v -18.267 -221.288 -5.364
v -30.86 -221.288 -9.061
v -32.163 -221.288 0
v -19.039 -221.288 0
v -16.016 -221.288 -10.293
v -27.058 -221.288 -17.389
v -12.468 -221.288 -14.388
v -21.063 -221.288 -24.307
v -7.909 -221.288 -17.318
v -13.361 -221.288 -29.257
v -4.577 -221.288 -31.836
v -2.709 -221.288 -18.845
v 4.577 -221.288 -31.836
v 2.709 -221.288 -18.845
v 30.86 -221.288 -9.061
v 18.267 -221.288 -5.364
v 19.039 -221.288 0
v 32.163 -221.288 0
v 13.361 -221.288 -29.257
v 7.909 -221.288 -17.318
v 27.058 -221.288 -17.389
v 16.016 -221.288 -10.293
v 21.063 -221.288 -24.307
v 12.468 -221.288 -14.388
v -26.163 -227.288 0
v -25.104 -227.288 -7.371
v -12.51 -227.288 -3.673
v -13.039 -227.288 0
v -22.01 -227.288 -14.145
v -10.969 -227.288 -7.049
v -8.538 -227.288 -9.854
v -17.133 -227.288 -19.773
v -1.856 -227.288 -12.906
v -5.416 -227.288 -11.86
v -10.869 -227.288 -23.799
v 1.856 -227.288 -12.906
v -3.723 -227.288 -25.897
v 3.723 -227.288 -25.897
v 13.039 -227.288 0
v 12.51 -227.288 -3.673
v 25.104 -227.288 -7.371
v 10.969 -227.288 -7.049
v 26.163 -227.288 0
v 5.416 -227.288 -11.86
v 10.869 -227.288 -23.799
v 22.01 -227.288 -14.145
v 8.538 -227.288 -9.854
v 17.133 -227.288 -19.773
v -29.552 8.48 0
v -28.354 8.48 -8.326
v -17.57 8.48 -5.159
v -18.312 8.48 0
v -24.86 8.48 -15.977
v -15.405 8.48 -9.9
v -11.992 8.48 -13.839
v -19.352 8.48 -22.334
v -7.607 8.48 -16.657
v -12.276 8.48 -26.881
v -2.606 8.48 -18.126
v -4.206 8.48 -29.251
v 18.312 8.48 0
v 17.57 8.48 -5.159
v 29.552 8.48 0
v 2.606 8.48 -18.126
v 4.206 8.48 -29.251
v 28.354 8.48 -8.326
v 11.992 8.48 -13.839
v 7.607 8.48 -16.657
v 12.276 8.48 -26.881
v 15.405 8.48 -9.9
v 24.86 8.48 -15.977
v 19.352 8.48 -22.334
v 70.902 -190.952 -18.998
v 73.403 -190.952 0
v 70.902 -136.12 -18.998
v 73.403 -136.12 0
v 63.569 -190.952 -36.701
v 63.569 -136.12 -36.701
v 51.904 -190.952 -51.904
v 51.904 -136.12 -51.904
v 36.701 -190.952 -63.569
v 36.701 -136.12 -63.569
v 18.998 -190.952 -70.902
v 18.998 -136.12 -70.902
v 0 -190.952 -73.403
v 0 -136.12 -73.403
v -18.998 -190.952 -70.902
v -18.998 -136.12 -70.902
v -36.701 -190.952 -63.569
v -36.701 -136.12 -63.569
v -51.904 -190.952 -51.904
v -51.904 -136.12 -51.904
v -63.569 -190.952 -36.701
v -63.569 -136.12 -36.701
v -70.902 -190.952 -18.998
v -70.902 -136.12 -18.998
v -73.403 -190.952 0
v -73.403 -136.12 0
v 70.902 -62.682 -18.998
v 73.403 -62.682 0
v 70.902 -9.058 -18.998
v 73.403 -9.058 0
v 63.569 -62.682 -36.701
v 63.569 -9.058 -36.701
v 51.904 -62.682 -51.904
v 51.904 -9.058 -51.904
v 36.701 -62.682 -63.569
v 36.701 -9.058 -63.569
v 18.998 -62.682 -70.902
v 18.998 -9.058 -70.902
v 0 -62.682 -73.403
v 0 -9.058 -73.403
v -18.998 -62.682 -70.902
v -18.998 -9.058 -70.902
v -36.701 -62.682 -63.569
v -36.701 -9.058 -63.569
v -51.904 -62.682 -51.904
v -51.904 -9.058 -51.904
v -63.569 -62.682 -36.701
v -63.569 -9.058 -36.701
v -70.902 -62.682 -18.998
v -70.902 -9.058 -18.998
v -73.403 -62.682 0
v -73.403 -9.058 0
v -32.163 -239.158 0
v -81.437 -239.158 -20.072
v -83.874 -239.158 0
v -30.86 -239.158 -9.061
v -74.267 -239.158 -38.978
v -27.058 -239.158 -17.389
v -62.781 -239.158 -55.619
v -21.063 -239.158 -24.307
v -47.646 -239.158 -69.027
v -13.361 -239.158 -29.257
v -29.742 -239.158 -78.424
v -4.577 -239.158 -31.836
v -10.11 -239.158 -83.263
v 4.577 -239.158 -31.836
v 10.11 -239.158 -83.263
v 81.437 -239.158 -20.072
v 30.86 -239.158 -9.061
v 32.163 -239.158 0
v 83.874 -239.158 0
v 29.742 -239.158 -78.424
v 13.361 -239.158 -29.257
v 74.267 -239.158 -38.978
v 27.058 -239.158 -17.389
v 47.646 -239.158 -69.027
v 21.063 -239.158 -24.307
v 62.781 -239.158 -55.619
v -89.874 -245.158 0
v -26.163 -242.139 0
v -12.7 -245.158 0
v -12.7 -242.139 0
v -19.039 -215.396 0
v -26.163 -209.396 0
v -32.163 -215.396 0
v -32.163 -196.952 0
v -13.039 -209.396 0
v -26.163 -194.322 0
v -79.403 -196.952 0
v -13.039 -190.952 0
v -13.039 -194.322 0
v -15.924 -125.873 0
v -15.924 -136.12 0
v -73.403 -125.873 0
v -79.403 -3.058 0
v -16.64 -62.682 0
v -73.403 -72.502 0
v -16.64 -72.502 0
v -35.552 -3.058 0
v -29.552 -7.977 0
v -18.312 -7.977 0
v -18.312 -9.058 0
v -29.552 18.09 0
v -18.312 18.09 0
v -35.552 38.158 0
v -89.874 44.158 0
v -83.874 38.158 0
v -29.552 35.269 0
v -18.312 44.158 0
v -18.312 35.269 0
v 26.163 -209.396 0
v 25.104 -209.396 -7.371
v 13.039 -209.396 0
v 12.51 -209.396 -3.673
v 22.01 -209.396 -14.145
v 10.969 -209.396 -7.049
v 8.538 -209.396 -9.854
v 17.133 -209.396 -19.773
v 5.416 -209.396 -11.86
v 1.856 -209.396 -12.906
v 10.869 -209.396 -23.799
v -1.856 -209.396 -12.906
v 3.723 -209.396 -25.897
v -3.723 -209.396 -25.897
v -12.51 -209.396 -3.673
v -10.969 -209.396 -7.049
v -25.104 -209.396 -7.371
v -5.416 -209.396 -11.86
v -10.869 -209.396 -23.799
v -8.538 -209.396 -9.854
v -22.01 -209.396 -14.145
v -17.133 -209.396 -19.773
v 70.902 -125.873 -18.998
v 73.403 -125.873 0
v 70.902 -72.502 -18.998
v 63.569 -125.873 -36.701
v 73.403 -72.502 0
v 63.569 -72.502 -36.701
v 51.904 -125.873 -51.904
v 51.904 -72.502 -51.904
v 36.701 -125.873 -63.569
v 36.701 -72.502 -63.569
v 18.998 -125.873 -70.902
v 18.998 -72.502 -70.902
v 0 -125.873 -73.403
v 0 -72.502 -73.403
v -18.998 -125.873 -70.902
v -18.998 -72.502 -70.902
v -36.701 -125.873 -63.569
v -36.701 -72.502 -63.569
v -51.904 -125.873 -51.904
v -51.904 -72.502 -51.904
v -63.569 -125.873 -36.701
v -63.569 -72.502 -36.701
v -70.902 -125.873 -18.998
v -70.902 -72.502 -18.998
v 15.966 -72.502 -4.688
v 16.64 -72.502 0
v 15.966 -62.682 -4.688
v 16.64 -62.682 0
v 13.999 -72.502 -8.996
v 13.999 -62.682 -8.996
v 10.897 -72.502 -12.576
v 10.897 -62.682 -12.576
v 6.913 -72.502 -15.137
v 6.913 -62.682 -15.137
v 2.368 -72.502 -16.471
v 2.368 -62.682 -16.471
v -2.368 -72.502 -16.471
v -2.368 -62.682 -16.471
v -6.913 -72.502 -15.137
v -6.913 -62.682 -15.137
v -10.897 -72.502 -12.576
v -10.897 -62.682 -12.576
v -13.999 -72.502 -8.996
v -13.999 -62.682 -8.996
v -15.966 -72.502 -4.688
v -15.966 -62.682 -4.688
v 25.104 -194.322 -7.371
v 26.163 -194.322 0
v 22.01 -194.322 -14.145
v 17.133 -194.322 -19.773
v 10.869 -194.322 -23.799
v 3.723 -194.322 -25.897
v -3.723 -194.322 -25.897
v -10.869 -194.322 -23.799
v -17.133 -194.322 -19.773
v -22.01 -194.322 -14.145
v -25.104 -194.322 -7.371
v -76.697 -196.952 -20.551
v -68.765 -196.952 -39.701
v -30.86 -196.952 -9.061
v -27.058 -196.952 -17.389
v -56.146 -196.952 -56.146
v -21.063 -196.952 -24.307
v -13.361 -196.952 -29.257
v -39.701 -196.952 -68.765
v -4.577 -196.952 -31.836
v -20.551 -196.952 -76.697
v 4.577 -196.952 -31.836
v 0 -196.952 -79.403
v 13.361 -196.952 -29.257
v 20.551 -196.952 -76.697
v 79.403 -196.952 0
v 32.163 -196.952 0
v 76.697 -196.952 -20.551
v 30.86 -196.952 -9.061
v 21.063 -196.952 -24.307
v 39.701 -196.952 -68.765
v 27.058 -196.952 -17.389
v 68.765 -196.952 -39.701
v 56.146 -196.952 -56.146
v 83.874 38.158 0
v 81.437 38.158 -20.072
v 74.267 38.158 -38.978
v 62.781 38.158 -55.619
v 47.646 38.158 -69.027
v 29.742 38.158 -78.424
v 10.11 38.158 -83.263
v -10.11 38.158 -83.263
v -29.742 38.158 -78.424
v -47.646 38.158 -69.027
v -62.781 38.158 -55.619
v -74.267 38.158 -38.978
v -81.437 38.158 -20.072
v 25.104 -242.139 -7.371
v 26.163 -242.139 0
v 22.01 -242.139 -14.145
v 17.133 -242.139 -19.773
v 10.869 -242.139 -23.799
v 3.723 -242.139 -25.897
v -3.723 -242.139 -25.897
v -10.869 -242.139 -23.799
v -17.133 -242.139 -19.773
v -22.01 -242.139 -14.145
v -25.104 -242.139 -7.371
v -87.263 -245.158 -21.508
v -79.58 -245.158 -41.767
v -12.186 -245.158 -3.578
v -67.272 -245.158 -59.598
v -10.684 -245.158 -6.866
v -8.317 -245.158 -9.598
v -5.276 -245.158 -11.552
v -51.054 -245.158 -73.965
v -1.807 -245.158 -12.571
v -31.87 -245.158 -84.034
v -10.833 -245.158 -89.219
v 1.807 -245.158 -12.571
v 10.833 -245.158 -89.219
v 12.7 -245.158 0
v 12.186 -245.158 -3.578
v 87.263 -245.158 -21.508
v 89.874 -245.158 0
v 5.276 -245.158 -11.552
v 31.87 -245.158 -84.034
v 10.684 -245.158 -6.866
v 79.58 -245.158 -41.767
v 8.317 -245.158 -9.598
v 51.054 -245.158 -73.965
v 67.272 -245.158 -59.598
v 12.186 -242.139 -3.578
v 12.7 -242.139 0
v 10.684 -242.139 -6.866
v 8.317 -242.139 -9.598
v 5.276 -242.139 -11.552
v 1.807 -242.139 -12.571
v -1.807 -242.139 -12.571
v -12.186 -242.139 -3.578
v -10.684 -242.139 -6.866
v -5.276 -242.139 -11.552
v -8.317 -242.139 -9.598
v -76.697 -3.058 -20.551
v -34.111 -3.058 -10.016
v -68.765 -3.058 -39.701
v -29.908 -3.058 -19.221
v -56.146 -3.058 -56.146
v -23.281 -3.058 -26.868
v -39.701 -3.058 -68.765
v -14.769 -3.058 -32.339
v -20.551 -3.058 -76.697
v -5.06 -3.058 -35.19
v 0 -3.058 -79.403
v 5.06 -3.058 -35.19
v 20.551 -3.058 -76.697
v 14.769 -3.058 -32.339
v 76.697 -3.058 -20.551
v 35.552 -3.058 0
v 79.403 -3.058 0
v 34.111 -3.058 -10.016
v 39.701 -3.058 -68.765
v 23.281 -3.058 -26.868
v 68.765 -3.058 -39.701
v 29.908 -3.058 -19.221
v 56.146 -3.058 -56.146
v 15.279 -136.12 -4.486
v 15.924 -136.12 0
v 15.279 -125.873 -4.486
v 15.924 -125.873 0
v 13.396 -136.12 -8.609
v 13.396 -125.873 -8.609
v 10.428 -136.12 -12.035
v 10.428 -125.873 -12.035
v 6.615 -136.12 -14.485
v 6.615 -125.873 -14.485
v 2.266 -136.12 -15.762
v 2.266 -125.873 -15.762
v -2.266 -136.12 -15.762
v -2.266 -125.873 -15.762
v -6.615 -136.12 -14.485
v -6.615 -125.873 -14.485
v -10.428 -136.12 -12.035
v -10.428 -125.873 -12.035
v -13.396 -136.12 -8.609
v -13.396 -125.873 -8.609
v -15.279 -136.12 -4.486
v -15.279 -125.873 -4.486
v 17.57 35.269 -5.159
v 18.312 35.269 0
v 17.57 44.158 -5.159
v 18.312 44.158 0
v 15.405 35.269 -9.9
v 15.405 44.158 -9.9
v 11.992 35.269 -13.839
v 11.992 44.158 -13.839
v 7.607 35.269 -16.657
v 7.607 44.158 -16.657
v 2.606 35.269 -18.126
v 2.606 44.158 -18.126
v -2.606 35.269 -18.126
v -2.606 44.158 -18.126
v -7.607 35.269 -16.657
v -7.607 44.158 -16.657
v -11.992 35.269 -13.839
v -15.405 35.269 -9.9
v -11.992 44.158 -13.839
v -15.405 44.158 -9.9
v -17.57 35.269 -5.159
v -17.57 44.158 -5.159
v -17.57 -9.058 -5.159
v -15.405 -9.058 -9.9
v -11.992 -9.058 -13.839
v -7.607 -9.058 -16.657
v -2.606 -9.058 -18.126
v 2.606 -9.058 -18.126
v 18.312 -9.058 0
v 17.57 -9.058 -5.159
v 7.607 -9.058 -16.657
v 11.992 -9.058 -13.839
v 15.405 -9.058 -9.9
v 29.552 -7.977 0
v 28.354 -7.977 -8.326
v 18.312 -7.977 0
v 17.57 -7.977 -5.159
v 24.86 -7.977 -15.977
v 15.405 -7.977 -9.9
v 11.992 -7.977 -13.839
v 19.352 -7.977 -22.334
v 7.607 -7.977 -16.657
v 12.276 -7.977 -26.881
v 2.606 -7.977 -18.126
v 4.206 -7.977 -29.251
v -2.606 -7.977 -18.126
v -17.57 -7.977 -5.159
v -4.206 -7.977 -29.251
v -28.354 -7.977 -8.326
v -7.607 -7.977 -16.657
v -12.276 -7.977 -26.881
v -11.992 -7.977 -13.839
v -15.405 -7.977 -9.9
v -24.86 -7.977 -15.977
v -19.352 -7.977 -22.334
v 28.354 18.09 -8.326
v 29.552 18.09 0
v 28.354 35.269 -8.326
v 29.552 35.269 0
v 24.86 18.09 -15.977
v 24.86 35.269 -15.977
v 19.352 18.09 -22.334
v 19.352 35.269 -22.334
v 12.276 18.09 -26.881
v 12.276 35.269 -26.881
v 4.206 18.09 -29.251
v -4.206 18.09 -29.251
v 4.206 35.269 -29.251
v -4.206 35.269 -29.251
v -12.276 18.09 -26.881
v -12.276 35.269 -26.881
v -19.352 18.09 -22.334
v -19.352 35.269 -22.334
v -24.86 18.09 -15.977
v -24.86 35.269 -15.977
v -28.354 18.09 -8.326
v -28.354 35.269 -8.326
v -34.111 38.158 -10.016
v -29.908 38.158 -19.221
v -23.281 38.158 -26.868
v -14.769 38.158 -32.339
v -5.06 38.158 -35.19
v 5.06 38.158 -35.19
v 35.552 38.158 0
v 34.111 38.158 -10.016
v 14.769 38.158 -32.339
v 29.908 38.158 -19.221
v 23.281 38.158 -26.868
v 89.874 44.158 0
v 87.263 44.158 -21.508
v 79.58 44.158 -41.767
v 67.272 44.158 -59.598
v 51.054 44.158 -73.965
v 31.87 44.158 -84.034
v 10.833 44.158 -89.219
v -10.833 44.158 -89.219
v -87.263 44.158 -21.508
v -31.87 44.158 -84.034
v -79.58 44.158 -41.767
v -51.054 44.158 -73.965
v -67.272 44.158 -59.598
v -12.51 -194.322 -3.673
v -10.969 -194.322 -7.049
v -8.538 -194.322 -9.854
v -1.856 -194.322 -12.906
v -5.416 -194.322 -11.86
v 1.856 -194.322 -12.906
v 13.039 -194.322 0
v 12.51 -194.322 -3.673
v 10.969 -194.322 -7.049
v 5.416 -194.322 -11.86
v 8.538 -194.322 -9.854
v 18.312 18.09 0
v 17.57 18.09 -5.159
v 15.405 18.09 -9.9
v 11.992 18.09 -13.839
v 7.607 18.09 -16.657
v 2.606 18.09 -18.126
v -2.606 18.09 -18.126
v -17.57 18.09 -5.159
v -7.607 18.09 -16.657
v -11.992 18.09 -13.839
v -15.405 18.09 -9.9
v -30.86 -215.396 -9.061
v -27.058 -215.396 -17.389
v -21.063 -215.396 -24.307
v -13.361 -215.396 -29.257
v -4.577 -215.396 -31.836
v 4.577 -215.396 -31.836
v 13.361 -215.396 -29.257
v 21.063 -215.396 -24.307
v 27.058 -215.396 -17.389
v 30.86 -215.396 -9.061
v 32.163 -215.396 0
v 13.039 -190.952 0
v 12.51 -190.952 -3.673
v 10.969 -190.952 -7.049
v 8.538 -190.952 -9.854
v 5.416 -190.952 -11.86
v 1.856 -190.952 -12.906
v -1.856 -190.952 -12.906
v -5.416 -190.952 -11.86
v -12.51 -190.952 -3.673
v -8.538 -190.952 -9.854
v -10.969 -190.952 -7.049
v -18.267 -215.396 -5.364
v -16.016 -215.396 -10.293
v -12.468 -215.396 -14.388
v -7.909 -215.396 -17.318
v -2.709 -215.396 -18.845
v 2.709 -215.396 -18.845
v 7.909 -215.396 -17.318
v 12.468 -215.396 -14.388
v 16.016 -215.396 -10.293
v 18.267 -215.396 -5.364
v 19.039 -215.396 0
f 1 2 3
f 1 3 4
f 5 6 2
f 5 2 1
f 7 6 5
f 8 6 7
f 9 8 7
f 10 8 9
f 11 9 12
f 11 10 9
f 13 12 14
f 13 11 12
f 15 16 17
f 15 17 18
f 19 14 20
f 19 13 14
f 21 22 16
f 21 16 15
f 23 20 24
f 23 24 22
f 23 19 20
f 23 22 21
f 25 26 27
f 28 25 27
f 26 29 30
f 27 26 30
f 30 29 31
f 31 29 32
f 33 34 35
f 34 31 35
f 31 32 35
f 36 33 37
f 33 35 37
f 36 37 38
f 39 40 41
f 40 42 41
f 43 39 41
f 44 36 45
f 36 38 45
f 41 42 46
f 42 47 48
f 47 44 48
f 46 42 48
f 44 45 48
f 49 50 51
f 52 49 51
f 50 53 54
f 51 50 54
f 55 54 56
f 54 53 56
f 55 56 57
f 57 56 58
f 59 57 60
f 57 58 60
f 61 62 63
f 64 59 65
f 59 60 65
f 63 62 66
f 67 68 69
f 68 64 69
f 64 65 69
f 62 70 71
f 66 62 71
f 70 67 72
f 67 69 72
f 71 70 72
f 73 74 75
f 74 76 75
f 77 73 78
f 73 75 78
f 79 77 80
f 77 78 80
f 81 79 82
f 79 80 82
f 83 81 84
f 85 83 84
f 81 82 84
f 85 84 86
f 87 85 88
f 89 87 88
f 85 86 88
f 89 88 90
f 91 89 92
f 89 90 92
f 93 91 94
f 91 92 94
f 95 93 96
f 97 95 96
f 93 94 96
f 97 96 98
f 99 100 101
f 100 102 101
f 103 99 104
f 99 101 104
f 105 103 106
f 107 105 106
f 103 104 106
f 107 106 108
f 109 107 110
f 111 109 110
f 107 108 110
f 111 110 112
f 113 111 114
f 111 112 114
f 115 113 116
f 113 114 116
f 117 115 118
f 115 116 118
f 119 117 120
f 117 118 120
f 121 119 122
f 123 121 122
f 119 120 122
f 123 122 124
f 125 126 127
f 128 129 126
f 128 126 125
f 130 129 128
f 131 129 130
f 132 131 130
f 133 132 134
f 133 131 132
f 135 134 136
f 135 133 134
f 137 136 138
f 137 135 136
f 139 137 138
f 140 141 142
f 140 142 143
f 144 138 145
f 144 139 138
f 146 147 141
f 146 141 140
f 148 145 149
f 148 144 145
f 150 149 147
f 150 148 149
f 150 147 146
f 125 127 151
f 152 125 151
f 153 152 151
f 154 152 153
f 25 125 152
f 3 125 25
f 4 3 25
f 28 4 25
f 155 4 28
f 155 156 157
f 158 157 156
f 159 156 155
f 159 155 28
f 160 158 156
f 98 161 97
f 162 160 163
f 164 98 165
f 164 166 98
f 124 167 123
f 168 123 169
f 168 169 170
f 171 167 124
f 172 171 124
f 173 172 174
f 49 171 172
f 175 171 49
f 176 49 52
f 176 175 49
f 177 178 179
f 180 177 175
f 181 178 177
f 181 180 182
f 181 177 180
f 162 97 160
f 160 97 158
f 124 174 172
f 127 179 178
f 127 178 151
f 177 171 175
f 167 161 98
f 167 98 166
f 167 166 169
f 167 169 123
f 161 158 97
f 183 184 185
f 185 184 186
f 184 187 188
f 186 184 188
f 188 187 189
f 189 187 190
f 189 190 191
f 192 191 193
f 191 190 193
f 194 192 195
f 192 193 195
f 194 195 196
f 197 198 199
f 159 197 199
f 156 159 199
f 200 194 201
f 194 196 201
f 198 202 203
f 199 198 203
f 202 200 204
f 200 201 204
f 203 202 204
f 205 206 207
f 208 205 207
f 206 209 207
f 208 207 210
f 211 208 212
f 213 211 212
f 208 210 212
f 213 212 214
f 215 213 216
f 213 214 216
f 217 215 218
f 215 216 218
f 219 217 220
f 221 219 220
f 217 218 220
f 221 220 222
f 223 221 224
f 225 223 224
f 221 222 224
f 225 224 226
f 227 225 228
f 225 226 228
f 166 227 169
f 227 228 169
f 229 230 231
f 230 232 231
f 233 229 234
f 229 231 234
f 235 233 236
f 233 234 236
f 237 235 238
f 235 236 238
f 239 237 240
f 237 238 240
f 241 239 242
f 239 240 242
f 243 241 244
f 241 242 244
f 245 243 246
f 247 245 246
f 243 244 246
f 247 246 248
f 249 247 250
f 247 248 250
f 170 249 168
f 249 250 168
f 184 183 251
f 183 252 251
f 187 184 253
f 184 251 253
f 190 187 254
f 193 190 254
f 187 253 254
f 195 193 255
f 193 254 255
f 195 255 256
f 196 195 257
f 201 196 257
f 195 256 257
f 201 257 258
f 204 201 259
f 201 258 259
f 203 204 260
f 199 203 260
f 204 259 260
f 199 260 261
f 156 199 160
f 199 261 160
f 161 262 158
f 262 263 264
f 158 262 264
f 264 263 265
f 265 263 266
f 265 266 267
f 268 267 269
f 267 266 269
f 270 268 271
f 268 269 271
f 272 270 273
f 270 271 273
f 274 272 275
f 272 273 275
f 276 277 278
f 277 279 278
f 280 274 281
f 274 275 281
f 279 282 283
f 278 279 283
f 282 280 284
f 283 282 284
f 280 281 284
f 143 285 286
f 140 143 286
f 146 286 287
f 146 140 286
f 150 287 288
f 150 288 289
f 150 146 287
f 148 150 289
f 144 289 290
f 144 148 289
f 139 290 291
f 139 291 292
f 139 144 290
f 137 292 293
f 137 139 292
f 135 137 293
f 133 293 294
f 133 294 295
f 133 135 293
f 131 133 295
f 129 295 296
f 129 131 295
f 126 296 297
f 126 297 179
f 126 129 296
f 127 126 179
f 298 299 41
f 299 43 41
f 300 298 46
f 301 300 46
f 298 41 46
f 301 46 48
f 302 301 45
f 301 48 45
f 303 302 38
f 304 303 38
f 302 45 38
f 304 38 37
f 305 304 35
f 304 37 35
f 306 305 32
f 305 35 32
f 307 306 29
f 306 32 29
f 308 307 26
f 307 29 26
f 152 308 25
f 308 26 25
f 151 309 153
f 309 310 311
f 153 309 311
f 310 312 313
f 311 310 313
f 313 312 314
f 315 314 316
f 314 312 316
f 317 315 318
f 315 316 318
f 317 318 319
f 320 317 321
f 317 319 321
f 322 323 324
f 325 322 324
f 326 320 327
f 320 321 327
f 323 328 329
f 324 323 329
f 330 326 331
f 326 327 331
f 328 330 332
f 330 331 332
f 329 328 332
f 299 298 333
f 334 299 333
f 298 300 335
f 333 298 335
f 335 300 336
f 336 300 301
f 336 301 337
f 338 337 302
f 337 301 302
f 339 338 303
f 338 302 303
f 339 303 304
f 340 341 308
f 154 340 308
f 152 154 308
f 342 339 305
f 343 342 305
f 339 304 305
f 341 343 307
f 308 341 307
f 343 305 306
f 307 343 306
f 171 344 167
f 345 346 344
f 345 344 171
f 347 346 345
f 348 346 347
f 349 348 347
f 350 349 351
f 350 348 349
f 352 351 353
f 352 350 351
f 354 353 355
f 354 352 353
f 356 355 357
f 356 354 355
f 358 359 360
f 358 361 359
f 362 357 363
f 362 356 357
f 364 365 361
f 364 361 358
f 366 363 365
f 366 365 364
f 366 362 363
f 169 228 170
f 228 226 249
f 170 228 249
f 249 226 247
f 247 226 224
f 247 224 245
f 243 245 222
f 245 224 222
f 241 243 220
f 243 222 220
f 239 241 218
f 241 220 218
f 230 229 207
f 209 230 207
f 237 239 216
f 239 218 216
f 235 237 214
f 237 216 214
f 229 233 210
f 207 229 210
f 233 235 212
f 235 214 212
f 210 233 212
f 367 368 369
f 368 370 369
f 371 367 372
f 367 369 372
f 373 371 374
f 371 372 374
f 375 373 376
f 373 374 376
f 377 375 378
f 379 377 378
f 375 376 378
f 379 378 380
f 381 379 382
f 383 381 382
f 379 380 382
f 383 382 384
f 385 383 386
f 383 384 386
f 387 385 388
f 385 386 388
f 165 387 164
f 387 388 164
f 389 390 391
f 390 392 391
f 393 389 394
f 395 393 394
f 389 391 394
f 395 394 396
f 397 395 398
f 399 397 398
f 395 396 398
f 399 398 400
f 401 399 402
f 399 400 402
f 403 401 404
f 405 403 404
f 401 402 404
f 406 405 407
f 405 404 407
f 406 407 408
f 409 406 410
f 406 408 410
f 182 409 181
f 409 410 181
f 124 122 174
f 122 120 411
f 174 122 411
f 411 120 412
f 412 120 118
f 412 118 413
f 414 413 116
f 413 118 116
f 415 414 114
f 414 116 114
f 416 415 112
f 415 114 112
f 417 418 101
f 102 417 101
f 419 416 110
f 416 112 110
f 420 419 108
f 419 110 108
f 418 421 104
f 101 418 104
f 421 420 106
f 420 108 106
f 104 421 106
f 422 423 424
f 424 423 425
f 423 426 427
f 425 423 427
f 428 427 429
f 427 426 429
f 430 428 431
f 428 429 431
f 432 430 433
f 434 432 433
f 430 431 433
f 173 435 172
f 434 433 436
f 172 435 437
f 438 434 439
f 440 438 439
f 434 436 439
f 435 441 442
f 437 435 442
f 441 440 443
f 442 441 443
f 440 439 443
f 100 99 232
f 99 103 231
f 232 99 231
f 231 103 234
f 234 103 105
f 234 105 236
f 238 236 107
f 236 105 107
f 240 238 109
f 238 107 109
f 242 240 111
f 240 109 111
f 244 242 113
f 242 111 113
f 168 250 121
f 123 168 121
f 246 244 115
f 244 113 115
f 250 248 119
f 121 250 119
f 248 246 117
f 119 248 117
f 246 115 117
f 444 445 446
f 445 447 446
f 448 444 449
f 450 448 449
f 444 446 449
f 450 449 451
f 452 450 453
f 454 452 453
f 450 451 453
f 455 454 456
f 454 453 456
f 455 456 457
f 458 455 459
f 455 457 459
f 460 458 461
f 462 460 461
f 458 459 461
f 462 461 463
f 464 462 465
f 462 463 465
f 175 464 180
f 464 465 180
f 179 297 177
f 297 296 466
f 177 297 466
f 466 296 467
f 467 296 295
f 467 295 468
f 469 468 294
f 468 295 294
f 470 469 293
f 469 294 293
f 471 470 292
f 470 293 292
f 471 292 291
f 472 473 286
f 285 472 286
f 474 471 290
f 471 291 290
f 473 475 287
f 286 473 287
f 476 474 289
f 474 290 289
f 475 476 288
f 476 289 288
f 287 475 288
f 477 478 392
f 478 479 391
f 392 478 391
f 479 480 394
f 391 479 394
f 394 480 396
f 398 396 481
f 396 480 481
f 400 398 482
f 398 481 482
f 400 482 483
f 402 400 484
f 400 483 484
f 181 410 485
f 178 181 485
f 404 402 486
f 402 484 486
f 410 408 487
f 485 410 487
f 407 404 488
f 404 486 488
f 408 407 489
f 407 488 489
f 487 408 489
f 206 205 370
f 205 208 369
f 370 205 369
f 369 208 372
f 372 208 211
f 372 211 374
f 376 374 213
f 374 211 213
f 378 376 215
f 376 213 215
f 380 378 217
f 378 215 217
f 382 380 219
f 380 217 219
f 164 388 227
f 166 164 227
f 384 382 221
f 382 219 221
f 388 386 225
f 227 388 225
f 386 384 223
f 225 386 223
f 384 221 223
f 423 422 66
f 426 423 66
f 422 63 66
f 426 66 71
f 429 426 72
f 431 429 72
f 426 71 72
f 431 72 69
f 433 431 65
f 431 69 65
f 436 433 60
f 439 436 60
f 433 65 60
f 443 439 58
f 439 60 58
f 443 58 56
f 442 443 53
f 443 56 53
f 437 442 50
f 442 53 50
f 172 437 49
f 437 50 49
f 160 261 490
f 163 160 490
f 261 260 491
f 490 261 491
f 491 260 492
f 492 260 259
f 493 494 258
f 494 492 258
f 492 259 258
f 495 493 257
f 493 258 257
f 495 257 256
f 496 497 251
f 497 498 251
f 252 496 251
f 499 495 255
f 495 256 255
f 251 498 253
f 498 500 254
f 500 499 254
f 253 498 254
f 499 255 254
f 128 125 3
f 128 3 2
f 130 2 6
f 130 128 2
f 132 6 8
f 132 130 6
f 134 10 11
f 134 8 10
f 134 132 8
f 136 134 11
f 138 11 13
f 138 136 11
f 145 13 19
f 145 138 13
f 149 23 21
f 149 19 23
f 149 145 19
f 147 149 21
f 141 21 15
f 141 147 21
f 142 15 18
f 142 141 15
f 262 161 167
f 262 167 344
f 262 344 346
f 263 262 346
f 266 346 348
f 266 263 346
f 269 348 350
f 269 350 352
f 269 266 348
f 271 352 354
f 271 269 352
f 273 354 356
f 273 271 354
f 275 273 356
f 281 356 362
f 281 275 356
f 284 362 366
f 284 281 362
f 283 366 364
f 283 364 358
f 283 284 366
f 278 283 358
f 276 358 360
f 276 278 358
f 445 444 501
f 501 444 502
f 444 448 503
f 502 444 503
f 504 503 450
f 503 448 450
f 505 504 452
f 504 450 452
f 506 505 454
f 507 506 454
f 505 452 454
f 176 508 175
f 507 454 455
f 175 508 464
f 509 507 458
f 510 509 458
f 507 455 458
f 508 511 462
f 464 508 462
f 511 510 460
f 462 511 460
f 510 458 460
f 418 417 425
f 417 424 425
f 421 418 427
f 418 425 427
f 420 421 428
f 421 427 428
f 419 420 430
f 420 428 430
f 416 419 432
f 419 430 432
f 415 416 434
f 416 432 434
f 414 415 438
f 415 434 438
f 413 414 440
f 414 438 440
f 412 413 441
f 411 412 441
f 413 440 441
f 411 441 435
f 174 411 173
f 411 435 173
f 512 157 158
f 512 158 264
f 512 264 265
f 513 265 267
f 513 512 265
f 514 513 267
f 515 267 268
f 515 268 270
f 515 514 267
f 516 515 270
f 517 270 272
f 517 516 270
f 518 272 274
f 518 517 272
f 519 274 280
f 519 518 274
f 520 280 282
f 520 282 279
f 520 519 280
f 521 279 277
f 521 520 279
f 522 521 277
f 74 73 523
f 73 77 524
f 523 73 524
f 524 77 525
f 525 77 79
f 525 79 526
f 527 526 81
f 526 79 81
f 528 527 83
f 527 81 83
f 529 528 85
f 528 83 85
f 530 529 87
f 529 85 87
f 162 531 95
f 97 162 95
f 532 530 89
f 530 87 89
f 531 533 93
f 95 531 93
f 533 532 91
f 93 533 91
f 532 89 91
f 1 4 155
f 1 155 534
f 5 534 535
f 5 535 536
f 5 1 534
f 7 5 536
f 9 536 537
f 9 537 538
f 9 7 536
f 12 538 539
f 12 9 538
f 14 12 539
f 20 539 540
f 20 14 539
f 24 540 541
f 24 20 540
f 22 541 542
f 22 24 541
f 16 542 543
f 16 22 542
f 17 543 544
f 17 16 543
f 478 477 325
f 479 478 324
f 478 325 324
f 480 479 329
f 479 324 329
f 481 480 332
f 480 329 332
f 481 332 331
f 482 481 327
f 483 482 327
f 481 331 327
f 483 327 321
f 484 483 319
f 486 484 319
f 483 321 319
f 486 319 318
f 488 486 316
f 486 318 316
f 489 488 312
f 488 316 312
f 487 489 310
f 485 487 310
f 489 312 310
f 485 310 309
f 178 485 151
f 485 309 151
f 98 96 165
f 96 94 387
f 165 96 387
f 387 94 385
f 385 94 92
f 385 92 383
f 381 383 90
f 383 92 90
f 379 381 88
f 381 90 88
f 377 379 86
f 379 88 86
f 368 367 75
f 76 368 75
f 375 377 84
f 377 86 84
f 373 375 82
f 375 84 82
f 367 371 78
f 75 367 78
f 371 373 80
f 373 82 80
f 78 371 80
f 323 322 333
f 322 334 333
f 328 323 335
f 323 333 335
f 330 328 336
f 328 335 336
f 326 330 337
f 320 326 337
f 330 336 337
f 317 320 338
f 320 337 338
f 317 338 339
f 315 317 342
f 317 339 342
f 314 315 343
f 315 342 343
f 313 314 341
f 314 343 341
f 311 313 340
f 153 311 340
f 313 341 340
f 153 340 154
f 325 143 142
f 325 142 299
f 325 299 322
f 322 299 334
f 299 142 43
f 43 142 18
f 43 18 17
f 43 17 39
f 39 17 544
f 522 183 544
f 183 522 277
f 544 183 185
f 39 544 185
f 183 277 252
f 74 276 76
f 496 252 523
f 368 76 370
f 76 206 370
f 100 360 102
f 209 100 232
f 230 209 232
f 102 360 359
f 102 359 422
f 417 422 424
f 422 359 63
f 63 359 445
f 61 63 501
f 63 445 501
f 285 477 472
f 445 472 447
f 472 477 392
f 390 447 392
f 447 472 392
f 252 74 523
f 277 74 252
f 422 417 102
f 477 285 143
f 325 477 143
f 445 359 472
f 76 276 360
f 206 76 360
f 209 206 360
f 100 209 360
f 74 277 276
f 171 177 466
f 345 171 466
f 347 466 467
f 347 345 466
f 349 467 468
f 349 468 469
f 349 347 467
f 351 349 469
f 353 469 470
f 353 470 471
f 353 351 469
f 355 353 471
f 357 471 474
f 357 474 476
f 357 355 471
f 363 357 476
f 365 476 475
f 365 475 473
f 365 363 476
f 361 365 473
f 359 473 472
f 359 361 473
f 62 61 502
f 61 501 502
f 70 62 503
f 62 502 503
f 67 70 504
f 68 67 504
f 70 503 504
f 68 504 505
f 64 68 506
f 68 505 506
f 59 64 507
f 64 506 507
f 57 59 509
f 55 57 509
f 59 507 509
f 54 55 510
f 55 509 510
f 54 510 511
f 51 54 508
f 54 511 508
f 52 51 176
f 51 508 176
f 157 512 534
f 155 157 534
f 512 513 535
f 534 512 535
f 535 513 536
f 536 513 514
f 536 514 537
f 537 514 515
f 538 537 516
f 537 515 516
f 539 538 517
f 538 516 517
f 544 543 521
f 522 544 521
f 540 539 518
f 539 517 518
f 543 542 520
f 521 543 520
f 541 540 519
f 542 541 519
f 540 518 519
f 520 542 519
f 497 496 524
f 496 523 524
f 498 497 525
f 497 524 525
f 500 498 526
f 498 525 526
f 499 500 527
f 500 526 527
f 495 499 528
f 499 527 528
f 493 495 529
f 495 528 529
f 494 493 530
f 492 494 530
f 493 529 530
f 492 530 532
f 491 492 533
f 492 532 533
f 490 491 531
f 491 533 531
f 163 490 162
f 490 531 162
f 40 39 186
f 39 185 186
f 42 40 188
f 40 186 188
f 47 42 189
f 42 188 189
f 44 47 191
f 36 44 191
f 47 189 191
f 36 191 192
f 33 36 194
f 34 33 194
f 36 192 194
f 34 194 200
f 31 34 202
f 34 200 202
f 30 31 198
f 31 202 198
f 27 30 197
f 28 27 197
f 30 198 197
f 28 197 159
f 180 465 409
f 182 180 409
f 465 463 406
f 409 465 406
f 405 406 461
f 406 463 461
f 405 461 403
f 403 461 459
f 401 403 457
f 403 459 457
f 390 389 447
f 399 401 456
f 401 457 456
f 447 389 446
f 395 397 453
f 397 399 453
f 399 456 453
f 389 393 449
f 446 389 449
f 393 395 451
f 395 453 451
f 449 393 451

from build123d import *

# Parameters (mm, degrees)
REVOLVE1_ANGLE = 180
SHELL1_START   = -239.158306138
SHELL1_DEPTH   = 42.206593174
SHELL1_START_2 = -3.058115052
SHELL1_2_DEPTH = 41.216014124
SHELL1_START_3 = -196.951712964
SHELL1_3_DEPTH = 193.893597912
SHELL1_START_4 = -221.288155922
SHELL1_4_DEPTH = 5.892364499


# Read off the part's stored shape, not the designer's step: Shell1
with BuildPart() as part:
    # Sketch1 → Revolve1 (revolve)
    with BuildSketch(Plane.XY):
        Polygon((89.874416534, -245.158306138), (12.7, -245.158306138), (12.7, -242.138884915), (26.163339875, -242.138884915), (26.163339875, -227.288155922), (13.03850974, -227.288155922), (13.03850974, -209.395791423), (26.163339875, -209.395791423), (26.163339875, -194.322320246), (13.03850974, -194.322320246), (13.03850974, -190.951712964), (73.402730944, -190.951712964), (73.402730944, -136.120329582), (15.924443856, -136.120329582), (15.924443856, -125.873058549), (73.402730944, -125.873058549), (73.402730944, -72.501855253), (16.640249143, -72.501855253), (16.640249143, -62.681553847), (73.402730944, -62.681553847), (73.402730944, -9.058115052), (18.31208302, -9.058115052), (18.31208302, -7.976977068), (29.551500324, -7.976977068), (29.551500324, 8.480345585), (18.31208302, 8.480345585), (18.31208302, 18.090461002), (29.551500324, 18.090461002), (29.551500324, 35.26854231), (18.31208302, 35.26854231), (18.31208302, 44.157899072), (89.874416534, 44.157899072), align=None)
    revolve(axis=Axis((0, 19.84375, 0), (0, 1, 0)), revolution_arc=REVOLVE1_ANGLE)

    # Shell1 outline → Shell1 (cut)
    with BuildSketch(Plane(origin=(0, 0, 0), x_dir=(1, 0, 0), z_dir=(0, 1, 0)).offset(SHELL1_START)):
        with BuildLine():
            ThreePointArc((83.874416534, 0), (0, 83.874416534), (-83.874416534, 0))
            Line((-83.874416534, 0), (-32.163339875, 0))
            ThreePointArc((-32.163339875, 0), (0, 32.163339875), (32.163339875, 0))
            Line((32.163339875, 0), (83.874416534, 0))
        make_face()
    extrude(amount=SHELL1_DEPTH, mode=Mode.SUBTRACT)

    # Shell1 2 outline → Shell1 2 (cut)
    with BuildSketch(Plane(origin=(0, 0, 0), x_dir=(1, 0, 0), z_dir=(0, 1, 0)).offset(SHELL1_START_2)):
        with BuildLine():
            ThreePointArc((83.874416534, 0), (0, 83.874416534), (-83.874416534, 0))
            Line((-83.874416534, 0), (-35.551500324, 0))
            ThreePointArc((-35.551500324, 0), (0, 35.551500324), (35.551500324, 0))
            Line((35.551500324, 0), (83.874416534, 0))
        make_face()
    extrude(amount=SHELL1_2_DEPTH, mode=Mode.SUBTRACT)

    # Shell1 3 outline → Shell1 3 (cut)
    with BuildSketch(Plane(origin=(0, 0, 0), x_dir=(1, 0, 0), z_dir=(0, 1, 0)).offset(SHELL1_START_3)):
        with BuildLine():
            ThreePointArc((83.874416534, 0), (0, 83.874416534), (-83.874416534, 0))
            Line((-83.874416534, 0), (-79.402730944, 0))
            ThreePointArc((-79.402730944, 0), (0, 79.402730944), (79.402730944, 0))
            Line((79.402730944, 0), (83.874416534, 0))
        make_face()
    extrude(amount=SHELL1_3_DEPTH, mode=Mode.SUBTRACT)

    # Shell1 4 outline → Shell1 4 (cut)
    with BuildSketch(Plane(origin=(0, 0, 0), x_dir=(1, 0, 0), z_dir=(0, 1, 0)).offset(SHELL1_START_4)):
        with BuildLine():
            ThreePointArc((32.163339875, 0), (0, 32.163339875), (-32.163339875, 0))
            Line((-32.163339875, 0), (-19.03850974, 0))
            ThreePointArc((-19.03850974, 0), (0, 19.03850974), (19.03850974, 0))
            Line((19.03850974, 0), (32.163339875, 0))
        make_face()
    extrude(amount=SHELL1_4_DEPTH, mode=Mode.SUBTRACT)


solid = part.part
